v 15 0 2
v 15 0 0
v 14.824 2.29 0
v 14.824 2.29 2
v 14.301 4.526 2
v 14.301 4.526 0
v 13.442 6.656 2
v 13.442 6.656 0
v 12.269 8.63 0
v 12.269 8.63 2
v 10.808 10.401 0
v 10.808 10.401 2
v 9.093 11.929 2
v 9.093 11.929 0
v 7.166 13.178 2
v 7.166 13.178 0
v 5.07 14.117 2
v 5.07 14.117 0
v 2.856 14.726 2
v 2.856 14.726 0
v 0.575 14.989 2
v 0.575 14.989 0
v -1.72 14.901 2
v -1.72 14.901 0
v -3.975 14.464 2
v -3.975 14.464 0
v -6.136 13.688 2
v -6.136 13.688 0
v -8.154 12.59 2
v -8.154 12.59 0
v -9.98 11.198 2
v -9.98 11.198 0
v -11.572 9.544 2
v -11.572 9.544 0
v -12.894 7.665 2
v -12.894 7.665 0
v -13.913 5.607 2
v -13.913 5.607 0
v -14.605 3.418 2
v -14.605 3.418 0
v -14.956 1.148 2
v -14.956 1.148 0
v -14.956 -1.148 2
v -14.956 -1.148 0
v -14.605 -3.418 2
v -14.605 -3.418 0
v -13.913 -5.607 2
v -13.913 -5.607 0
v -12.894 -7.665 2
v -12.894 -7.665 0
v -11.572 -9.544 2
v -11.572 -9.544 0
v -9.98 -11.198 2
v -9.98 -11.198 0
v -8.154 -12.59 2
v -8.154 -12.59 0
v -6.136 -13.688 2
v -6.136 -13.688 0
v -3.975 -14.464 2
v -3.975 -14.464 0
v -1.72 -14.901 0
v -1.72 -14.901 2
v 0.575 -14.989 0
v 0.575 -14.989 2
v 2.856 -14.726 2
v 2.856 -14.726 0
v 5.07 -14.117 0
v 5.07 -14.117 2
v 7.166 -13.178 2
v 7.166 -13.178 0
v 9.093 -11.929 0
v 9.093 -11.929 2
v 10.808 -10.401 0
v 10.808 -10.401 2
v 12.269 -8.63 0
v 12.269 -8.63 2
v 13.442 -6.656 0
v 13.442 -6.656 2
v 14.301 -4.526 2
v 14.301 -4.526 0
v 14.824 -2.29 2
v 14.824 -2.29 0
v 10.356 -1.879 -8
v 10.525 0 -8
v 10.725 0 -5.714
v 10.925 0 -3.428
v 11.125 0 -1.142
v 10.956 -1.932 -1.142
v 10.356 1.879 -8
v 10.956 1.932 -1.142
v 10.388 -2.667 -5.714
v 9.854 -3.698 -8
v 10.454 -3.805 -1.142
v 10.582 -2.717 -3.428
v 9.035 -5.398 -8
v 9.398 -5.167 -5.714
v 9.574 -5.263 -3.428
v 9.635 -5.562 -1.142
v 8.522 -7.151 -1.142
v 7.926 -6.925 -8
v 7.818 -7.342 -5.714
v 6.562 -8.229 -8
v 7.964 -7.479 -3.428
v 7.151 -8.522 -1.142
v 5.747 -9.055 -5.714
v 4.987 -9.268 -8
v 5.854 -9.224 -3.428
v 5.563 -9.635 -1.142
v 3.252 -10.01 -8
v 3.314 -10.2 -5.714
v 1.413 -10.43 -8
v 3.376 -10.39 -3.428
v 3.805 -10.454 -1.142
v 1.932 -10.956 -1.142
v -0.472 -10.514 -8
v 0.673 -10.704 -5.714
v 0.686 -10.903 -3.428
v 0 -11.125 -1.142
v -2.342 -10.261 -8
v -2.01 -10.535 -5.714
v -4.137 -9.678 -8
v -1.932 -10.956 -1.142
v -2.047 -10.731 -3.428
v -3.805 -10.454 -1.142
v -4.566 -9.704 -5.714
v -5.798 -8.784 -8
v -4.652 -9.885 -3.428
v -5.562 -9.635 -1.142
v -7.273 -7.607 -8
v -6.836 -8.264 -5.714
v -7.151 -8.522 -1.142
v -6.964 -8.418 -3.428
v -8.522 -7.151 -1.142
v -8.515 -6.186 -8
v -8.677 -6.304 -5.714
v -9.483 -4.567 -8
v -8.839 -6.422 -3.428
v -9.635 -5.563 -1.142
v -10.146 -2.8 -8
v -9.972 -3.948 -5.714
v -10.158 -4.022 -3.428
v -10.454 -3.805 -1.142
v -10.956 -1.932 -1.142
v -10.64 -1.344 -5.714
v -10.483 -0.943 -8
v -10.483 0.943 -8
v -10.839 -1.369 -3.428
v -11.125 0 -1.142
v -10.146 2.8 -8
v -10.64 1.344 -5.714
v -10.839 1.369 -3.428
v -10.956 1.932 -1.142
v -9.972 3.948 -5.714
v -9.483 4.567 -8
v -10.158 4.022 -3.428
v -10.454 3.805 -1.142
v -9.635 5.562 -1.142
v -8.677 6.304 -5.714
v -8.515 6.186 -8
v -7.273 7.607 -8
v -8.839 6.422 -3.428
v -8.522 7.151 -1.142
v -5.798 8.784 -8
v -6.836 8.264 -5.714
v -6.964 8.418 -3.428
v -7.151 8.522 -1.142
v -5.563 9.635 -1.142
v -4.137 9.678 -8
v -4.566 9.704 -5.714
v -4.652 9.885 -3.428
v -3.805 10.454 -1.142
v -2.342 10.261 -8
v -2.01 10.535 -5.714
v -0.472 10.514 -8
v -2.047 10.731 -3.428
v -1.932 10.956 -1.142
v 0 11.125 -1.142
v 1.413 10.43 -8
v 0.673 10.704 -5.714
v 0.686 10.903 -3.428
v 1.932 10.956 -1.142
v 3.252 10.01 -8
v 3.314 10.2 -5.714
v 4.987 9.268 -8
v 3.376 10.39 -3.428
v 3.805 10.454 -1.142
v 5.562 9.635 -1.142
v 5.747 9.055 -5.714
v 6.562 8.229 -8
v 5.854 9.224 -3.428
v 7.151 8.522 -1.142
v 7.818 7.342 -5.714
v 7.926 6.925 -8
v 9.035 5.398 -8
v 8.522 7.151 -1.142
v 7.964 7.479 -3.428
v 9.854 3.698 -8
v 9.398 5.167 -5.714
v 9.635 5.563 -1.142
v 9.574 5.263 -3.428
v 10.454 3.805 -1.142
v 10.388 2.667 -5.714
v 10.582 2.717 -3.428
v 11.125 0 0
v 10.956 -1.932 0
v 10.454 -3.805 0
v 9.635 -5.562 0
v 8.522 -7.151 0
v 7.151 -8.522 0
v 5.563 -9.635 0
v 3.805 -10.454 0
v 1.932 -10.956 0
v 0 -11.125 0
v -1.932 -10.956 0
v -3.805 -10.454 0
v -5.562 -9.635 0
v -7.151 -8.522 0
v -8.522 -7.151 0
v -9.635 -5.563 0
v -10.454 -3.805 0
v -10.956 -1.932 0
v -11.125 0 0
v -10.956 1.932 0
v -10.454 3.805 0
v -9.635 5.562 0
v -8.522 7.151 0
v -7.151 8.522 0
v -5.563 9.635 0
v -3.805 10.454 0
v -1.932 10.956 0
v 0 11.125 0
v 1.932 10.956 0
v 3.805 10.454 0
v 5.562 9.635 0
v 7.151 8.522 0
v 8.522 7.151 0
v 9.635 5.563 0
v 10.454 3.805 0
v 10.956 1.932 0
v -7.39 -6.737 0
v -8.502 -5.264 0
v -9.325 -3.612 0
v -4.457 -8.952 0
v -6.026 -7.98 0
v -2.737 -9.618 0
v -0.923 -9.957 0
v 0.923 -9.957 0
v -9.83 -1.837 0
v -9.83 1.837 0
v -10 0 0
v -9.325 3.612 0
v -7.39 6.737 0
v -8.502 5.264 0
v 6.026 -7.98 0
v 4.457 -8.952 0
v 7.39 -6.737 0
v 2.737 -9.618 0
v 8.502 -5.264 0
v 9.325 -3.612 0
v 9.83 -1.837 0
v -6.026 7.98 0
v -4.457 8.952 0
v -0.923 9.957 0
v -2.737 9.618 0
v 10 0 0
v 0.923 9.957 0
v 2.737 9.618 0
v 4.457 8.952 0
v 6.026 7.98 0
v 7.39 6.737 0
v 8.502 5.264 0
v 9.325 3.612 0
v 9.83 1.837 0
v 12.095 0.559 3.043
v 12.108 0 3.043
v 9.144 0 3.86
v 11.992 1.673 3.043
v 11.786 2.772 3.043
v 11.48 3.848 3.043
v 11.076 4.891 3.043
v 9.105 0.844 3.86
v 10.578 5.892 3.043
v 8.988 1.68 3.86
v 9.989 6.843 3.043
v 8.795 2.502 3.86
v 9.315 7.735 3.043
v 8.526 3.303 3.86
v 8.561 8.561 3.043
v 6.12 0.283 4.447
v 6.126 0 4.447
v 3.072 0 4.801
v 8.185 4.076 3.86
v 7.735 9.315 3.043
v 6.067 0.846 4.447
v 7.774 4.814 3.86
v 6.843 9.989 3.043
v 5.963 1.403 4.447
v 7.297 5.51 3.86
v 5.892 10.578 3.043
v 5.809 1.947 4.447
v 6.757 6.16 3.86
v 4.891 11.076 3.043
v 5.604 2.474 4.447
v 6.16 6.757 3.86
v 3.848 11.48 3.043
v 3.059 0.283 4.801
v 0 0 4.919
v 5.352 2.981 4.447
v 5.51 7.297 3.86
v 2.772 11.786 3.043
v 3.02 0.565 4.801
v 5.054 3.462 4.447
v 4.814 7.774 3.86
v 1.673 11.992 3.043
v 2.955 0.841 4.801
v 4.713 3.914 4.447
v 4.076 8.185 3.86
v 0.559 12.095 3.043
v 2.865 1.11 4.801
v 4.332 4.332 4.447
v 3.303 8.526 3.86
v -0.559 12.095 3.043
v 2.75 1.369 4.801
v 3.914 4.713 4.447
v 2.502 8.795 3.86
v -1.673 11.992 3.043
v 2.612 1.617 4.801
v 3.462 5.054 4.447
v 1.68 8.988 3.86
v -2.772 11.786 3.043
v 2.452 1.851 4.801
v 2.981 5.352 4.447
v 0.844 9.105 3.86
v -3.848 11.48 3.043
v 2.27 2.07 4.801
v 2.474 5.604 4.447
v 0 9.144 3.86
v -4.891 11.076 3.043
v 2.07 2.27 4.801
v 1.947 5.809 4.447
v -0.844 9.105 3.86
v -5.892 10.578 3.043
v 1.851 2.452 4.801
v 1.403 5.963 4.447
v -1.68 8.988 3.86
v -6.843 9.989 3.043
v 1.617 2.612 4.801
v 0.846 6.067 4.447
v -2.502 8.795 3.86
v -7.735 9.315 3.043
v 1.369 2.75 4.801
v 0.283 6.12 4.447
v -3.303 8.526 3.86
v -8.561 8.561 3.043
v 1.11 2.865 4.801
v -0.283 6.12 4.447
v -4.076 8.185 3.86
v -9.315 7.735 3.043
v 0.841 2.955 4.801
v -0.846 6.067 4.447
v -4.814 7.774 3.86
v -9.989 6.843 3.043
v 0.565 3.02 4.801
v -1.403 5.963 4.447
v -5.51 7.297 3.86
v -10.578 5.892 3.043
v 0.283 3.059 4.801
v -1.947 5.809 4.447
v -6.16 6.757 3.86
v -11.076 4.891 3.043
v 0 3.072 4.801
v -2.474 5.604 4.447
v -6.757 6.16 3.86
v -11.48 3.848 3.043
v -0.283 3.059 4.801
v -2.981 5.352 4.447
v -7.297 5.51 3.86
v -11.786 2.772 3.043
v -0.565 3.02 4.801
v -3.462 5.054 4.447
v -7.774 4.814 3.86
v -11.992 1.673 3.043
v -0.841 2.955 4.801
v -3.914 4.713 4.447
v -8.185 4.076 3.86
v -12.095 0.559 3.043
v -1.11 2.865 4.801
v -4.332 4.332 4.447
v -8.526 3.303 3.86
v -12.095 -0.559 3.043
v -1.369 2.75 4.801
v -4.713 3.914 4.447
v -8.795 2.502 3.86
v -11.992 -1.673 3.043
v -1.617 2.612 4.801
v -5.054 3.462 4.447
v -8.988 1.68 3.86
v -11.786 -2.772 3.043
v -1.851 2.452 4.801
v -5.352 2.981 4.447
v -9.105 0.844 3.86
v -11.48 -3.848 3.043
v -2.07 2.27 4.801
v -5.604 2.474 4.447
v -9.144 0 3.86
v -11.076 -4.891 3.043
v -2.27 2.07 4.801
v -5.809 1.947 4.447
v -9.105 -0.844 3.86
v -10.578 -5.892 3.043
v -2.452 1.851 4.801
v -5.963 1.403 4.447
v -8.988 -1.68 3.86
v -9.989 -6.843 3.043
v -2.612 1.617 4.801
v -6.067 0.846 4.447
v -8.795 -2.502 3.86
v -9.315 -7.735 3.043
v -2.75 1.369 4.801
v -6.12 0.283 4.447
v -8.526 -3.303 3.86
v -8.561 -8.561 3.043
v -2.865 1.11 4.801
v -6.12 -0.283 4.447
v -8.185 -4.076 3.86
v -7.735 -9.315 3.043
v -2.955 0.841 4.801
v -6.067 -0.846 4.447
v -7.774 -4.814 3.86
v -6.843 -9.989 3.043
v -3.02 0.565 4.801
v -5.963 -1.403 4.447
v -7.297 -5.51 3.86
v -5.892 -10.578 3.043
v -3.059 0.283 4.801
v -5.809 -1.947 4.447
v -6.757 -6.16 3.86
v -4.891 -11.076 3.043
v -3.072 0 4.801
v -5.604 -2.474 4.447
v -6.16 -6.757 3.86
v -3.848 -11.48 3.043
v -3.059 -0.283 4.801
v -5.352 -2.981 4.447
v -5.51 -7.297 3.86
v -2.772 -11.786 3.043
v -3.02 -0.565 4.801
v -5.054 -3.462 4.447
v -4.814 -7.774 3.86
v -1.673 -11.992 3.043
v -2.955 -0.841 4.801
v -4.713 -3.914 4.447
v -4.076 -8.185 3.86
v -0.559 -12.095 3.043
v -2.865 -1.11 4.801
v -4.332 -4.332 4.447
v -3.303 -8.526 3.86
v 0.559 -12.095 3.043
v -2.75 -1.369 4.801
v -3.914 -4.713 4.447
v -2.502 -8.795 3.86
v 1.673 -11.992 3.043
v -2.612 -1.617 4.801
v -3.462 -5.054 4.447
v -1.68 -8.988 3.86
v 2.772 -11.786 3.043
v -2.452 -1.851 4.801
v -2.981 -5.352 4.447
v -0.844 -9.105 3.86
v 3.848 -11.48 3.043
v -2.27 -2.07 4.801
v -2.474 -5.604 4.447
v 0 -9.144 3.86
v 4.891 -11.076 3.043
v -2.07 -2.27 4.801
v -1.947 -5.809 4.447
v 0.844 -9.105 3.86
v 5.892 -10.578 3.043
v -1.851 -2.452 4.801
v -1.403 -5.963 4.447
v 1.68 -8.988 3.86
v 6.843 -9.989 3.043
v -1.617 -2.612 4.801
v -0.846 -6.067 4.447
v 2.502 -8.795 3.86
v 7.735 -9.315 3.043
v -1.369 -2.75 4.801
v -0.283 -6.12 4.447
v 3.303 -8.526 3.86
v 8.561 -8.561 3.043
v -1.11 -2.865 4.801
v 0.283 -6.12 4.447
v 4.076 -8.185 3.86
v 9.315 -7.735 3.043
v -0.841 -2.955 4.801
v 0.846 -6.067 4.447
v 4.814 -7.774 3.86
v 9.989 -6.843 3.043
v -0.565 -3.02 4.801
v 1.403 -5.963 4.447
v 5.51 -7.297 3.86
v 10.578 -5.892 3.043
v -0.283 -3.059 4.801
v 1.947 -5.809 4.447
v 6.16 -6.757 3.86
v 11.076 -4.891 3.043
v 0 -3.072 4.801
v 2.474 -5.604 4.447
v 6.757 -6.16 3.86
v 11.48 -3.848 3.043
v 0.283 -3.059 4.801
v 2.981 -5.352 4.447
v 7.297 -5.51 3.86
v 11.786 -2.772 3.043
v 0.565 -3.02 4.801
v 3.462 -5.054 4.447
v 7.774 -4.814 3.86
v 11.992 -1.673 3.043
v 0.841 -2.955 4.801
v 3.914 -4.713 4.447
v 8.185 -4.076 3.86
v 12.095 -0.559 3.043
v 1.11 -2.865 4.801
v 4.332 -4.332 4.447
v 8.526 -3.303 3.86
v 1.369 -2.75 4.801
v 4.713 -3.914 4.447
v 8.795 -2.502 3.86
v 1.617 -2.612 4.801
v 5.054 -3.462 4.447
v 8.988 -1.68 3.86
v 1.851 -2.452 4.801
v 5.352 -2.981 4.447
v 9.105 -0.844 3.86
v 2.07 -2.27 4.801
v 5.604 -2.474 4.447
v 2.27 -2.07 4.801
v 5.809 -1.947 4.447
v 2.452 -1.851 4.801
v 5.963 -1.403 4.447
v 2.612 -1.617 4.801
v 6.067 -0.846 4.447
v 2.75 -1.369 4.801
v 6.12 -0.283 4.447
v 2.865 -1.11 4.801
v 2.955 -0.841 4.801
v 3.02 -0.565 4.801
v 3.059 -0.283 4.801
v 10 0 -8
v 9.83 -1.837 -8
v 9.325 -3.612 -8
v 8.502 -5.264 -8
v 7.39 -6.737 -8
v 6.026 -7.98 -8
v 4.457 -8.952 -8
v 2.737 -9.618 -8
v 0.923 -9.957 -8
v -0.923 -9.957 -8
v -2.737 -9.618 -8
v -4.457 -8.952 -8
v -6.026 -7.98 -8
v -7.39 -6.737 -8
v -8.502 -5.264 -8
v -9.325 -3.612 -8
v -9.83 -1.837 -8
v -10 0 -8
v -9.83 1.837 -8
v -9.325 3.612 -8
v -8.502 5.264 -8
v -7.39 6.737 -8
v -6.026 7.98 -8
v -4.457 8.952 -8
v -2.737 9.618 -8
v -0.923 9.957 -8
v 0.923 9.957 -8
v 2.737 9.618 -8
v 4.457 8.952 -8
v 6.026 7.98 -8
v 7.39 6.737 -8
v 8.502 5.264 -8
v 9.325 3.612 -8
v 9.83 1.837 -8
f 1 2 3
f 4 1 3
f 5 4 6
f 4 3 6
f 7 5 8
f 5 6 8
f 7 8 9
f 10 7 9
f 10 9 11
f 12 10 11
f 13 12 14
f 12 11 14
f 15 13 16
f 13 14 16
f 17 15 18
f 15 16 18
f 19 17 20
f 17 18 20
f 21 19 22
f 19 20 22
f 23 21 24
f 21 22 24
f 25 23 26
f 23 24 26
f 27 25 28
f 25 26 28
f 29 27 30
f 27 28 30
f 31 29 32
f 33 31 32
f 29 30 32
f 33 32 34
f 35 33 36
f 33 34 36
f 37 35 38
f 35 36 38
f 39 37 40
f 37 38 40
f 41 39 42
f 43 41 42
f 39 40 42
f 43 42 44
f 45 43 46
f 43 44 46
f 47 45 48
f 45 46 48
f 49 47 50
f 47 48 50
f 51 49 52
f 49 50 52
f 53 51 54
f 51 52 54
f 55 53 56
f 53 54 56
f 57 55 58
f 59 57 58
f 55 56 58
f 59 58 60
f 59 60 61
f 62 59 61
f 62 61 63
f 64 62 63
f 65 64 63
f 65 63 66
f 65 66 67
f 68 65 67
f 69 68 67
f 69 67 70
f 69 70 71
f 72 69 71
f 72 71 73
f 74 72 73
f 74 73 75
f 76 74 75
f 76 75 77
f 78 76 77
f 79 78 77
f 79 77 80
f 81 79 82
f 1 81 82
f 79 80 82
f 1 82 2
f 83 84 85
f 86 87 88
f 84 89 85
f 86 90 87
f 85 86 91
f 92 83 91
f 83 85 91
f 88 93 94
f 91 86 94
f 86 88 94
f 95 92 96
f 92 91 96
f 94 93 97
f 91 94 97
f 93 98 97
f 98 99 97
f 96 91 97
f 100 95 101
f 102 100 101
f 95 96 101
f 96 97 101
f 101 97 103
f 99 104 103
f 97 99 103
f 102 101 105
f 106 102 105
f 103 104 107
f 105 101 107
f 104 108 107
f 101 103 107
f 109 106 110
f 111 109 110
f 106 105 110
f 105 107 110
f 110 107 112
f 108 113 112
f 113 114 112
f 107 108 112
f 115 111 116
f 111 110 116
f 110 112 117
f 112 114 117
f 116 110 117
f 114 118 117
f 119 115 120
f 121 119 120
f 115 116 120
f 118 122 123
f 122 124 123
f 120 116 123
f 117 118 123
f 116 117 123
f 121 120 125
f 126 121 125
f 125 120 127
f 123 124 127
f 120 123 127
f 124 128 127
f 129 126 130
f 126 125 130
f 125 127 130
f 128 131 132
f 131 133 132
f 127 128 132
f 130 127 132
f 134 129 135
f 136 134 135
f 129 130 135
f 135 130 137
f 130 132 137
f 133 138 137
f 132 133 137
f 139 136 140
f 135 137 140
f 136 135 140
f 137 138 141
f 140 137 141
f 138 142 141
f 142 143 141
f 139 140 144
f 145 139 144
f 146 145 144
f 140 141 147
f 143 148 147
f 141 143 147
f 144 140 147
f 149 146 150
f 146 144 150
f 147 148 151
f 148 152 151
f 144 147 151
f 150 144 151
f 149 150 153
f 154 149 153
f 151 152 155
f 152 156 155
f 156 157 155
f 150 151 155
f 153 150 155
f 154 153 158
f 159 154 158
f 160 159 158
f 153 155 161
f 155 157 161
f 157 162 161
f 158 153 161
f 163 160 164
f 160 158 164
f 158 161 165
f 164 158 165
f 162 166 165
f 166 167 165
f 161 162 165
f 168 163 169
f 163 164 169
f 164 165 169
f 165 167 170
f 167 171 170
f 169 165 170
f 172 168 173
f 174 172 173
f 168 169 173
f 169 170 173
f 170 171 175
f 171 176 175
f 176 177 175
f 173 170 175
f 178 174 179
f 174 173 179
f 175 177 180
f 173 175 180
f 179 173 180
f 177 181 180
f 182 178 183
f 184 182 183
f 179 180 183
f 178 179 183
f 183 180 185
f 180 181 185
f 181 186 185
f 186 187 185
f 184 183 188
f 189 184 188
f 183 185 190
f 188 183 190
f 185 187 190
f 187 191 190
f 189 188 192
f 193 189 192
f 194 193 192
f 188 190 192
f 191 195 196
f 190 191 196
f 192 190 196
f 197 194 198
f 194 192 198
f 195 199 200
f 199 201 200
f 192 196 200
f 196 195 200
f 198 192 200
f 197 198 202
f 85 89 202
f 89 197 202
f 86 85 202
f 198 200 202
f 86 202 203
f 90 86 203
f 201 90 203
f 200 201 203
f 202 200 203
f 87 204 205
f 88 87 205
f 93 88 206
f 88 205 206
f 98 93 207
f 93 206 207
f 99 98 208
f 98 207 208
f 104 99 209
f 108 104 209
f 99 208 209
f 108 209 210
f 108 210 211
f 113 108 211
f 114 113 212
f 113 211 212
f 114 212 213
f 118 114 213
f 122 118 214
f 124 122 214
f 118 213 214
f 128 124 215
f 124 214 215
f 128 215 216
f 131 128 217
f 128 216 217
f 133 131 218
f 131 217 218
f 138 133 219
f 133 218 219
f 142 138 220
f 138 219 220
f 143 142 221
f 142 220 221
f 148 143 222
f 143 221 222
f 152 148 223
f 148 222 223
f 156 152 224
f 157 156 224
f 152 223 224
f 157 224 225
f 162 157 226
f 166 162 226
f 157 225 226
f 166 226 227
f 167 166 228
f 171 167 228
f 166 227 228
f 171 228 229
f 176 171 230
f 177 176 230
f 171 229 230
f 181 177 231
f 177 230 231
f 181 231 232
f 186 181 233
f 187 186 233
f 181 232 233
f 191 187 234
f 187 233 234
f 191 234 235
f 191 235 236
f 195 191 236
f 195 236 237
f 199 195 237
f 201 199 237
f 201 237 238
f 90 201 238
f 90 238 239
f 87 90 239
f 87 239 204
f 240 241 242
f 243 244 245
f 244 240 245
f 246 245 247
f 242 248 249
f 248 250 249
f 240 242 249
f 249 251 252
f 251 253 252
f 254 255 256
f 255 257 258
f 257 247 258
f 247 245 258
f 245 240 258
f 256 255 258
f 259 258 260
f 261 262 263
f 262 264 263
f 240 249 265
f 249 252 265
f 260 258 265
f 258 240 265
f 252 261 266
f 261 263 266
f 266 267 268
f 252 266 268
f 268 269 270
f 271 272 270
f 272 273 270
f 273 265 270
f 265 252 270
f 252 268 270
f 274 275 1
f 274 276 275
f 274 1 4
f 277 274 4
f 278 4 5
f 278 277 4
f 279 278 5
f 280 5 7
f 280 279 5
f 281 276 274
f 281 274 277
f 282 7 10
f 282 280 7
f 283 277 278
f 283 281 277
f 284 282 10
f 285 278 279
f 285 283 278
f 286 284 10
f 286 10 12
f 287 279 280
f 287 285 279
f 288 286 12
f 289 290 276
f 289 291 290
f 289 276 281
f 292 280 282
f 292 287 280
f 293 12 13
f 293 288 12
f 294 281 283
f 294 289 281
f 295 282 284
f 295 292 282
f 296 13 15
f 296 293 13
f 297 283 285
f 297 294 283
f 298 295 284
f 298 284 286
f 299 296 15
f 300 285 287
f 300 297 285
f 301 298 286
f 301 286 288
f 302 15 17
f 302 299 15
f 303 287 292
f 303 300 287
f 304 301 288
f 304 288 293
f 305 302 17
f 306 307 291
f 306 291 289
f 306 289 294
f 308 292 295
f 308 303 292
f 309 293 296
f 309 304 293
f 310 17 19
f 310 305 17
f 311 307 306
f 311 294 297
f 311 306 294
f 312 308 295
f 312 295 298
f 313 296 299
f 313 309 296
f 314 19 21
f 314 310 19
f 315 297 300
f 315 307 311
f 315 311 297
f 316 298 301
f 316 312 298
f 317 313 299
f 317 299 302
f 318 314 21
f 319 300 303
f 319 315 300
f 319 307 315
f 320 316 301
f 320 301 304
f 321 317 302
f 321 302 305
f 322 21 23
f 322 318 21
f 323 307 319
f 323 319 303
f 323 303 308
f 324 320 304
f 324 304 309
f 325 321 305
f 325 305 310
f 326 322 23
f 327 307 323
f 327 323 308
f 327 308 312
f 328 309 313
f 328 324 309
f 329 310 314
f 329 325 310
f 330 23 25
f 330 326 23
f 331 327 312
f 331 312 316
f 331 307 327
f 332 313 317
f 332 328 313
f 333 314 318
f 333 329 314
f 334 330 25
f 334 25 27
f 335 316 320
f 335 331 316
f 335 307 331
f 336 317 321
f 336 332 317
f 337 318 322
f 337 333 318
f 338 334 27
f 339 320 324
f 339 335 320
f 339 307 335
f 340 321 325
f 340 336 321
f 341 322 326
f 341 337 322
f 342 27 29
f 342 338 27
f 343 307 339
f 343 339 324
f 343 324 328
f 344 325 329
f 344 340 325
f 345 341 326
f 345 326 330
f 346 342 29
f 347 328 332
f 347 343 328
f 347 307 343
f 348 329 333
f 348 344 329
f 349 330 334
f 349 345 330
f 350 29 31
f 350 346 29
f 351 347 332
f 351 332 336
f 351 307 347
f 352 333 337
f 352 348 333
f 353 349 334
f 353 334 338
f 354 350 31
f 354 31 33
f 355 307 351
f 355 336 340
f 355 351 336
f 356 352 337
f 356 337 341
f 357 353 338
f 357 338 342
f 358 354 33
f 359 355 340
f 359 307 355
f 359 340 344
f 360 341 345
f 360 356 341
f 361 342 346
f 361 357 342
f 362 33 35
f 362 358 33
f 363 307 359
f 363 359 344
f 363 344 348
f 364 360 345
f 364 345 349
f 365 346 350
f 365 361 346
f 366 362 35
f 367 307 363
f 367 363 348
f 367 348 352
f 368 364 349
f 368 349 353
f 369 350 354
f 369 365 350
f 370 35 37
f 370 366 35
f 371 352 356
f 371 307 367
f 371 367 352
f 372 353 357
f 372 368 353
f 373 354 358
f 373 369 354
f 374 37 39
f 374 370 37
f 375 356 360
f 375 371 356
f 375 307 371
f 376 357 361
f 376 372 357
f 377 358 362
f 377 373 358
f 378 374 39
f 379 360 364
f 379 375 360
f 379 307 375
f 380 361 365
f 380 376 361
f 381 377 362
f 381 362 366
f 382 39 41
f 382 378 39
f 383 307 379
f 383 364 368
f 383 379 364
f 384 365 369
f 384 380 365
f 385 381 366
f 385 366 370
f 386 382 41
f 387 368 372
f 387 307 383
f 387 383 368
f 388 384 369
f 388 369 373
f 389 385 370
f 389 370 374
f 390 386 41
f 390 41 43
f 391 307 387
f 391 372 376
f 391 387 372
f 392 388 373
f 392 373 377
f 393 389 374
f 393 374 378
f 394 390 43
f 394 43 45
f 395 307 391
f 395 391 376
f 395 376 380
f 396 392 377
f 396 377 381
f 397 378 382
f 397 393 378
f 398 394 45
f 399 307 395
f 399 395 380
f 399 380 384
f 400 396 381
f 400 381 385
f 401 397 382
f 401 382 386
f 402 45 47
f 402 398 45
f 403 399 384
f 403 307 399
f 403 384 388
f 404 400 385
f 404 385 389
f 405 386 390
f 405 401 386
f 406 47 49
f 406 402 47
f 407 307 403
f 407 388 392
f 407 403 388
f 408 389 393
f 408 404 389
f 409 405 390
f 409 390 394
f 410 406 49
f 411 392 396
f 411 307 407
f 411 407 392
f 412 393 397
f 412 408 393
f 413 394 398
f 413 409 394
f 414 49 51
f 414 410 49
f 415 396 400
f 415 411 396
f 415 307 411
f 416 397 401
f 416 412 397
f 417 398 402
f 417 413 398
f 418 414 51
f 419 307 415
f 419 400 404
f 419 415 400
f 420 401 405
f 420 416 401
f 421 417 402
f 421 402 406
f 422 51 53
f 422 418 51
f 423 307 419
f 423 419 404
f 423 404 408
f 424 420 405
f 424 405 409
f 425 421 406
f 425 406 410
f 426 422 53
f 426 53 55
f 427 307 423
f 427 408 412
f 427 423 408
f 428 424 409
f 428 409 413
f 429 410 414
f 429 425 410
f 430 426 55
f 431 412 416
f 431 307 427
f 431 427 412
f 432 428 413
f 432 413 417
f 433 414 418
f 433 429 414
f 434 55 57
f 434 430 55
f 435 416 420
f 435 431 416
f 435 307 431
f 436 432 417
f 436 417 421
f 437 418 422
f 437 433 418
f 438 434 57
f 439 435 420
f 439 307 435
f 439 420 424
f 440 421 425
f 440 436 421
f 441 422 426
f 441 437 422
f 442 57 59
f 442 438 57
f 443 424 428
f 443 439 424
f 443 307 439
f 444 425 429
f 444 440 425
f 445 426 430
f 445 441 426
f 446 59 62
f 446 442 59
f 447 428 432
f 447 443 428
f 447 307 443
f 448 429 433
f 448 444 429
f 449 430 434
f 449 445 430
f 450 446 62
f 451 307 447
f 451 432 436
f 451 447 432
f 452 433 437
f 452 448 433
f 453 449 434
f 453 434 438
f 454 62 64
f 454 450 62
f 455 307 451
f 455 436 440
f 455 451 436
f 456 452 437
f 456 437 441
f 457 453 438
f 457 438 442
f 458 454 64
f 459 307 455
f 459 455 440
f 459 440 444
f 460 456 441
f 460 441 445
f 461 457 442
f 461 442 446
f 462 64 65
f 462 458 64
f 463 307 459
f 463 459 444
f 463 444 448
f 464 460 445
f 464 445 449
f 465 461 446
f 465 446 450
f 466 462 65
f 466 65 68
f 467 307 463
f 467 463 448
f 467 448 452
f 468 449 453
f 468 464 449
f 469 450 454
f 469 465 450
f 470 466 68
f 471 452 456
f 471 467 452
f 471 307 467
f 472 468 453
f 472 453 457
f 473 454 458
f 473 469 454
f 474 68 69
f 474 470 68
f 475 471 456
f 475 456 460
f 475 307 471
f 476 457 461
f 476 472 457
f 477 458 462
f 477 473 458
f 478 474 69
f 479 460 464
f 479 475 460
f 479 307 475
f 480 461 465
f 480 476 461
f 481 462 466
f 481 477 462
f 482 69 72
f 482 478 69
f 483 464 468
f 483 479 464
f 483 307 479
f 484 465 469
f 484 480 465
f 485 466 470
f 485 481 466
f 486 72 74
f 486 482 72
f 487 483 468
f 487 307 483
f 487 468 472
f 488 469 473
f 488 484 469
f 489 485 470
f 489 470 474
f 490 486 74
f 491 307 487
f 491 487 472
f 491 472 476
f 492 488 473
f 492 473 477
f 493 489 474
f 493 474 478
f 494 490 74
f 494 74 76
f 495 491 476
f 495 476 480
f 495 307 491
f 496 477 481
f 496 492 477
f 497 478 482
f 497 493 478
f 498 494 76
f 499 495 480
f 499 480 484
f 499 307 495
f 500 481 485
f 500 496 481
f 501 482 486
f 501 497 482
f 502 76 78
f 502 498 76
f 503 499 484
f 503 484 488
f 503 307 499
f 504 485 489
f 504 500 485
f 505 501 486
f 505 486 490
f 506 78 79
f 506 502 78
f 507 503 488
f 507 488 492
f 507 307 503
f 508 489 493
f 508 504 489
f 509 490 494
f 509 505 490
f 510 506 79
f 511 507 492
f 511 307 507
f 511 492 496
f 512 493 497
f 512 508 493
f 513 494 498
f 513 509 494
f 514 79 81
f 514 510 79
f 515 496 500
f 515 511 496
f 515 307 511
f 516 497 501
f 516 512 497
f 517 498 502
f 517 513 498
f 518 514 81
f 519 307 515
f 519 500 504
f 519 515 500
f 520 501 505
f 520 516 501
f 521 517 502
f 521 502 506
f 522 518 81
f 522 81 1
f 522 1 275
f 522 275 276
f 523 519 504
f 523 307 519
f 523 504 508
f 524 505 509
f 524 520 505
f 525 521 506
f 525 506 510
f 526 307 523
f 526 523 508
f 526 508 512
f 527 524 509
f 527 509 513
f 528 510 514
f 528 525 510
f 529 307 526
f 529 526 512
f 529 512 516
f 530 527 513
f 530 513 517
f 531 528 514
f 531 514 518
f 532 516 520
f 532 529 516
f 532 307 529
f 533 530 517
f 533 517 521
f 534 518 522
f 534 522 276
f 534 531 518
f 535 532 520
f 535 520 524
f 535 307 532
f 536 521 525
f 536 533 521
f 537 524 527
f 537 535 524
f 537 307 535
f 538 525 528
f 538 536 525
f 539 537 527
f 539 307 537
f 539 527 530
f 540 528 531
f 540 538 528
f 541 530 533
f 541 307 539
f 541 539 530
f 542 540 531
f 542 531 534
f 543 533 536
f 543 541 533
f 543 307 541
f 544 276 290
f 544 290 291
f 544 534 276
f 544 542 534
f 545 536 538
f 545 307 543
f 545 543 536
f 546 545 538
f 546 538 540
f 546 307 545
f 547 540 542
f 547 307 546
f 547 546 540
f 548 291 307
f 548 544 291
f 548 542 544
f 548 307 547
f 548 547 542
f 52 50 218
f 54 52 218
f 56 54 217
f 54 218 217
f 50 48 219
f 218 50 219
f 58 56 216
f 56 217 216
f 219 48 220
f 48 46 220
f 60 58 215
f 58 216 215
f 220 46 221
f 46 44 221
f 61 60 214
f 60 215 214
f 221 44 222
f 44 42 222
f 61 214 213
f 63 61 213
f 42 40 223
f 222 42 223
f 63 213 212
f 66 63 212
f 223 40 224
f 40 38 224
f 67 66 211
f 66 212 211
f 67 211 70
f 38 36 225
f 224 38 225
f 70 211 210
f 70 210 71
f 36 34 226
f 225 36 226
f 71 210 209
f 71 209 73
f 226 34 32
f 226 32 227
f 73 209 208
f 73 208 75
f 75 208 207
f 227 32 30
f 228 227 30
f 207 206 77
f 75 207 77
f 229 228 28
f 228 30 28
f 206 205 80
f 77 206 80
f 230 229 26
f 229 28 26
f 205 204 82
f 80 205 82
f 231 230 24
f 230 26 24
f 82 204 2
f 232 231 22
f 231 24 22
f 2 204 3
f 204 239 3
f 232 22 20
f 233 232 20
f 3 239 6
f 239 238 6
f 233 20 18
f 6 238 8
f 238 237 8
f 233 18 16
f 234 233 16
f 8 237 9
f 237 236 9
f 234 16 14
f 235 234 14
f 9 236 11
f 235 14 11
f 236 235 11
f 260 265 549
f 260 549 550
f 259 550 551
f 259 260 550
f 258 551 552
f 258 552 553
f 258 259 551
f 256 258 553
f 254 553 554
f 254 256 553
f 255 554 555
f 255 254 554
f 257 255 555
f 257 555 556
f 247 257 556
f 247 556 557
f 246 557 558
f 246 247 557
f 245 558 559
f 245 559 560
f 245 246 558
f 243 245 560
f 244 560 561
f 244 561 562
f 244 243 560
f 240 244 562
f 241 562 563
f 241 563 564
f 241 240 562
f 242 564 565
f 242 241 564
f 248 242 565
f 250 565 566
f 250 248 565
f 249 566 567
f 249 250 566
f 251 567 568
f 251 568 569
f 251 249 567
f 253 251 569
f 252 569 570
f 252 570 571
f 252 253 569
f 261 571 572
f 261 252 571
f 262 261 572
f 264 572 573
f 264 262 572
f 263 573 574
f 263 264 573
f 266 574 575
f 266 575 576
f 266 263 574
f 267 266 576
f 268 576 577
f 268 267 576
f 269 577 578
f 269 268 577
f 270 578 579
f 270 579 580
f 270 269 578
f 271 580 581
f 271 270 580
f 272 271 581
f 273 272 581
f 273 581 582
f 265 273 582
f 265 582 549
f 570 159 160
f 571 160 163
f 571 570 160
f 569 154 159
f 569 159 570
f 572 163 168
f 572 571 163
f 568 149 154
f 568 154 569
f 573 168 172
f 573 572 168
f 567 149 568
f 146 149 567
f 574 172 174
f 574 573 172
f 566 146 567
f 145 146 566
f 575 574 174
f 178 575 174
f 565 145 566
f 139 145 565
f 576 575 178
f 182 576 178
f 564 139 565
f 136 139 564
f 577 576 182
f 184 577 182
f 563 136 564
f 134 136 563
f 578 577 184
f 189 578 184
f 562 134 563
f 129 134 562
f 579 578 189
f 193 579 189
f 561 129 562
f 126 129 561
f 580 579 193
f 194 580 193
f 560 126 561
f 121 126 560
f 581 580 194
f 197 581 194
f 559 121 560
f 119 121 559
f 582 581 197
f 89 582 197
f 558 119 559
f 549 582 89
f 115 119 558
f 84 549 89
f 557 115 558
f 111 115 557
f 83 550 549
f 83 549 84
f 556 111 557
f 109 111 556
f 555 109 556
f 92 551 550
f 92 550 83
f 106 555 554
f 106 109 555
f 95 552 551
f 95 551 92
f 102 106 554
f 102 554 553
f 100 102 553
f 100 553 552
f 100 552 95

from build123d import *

# Parameters (mm, degrees)
F0_R     = 15
F1_DEPTH = 2
F2_R     = 11.125
F2_R_2   = 10
F3_DEPTH = 8
F4_SIZE2 = 6.8580313817
F4_SIZE  = 0.6


with BuildPart() as f1:
    # F0 (on Top) → F1 (new body)
    with BuildSketch(Plane.XY):
        Circle(F0_R)
    extrude(amount=F1_DEPTH)

    # F2 (on face) → F3 (join)
    with BuildSketch(Plane(origin=(0, 0, 0), x_dir=(1, 0, 0), z_dir=(0, 0, -1))):
        Circle(F2_R)
        Circle(F2_R_2, mode=Mode.SUBTRACT)
    extrude(amount=F3_DEPTH)

    # F4
    f4_edges = [f1.edges().sort_by_distance(p)[0] for p in [
        (-11.125, 0, -8),
    ]]
    f4_side = f1.faces().sort_by_distance((-10.810337, 0, -8))[0]
    chamfer(f4_edges, length=F4_SIZE, length2=F4_SIZE2, reference=f4_side)

    # F5 (on Front) → F6 (revolve)
    with BuildSketch(Plane.XZ):
        with BuildLine():
            Line((0, 4.9190075645), (0, 2))
            Line((0, 2), (15, 2))
            ThreePointArc((15, 2), (7.6406904983, 4.1824746645), (0, 4.9190075645))
        make_face()
    revolve(axis=Axis((0, 0, 3.4595037823), (0, 0, 1)))


solid = f1.part
